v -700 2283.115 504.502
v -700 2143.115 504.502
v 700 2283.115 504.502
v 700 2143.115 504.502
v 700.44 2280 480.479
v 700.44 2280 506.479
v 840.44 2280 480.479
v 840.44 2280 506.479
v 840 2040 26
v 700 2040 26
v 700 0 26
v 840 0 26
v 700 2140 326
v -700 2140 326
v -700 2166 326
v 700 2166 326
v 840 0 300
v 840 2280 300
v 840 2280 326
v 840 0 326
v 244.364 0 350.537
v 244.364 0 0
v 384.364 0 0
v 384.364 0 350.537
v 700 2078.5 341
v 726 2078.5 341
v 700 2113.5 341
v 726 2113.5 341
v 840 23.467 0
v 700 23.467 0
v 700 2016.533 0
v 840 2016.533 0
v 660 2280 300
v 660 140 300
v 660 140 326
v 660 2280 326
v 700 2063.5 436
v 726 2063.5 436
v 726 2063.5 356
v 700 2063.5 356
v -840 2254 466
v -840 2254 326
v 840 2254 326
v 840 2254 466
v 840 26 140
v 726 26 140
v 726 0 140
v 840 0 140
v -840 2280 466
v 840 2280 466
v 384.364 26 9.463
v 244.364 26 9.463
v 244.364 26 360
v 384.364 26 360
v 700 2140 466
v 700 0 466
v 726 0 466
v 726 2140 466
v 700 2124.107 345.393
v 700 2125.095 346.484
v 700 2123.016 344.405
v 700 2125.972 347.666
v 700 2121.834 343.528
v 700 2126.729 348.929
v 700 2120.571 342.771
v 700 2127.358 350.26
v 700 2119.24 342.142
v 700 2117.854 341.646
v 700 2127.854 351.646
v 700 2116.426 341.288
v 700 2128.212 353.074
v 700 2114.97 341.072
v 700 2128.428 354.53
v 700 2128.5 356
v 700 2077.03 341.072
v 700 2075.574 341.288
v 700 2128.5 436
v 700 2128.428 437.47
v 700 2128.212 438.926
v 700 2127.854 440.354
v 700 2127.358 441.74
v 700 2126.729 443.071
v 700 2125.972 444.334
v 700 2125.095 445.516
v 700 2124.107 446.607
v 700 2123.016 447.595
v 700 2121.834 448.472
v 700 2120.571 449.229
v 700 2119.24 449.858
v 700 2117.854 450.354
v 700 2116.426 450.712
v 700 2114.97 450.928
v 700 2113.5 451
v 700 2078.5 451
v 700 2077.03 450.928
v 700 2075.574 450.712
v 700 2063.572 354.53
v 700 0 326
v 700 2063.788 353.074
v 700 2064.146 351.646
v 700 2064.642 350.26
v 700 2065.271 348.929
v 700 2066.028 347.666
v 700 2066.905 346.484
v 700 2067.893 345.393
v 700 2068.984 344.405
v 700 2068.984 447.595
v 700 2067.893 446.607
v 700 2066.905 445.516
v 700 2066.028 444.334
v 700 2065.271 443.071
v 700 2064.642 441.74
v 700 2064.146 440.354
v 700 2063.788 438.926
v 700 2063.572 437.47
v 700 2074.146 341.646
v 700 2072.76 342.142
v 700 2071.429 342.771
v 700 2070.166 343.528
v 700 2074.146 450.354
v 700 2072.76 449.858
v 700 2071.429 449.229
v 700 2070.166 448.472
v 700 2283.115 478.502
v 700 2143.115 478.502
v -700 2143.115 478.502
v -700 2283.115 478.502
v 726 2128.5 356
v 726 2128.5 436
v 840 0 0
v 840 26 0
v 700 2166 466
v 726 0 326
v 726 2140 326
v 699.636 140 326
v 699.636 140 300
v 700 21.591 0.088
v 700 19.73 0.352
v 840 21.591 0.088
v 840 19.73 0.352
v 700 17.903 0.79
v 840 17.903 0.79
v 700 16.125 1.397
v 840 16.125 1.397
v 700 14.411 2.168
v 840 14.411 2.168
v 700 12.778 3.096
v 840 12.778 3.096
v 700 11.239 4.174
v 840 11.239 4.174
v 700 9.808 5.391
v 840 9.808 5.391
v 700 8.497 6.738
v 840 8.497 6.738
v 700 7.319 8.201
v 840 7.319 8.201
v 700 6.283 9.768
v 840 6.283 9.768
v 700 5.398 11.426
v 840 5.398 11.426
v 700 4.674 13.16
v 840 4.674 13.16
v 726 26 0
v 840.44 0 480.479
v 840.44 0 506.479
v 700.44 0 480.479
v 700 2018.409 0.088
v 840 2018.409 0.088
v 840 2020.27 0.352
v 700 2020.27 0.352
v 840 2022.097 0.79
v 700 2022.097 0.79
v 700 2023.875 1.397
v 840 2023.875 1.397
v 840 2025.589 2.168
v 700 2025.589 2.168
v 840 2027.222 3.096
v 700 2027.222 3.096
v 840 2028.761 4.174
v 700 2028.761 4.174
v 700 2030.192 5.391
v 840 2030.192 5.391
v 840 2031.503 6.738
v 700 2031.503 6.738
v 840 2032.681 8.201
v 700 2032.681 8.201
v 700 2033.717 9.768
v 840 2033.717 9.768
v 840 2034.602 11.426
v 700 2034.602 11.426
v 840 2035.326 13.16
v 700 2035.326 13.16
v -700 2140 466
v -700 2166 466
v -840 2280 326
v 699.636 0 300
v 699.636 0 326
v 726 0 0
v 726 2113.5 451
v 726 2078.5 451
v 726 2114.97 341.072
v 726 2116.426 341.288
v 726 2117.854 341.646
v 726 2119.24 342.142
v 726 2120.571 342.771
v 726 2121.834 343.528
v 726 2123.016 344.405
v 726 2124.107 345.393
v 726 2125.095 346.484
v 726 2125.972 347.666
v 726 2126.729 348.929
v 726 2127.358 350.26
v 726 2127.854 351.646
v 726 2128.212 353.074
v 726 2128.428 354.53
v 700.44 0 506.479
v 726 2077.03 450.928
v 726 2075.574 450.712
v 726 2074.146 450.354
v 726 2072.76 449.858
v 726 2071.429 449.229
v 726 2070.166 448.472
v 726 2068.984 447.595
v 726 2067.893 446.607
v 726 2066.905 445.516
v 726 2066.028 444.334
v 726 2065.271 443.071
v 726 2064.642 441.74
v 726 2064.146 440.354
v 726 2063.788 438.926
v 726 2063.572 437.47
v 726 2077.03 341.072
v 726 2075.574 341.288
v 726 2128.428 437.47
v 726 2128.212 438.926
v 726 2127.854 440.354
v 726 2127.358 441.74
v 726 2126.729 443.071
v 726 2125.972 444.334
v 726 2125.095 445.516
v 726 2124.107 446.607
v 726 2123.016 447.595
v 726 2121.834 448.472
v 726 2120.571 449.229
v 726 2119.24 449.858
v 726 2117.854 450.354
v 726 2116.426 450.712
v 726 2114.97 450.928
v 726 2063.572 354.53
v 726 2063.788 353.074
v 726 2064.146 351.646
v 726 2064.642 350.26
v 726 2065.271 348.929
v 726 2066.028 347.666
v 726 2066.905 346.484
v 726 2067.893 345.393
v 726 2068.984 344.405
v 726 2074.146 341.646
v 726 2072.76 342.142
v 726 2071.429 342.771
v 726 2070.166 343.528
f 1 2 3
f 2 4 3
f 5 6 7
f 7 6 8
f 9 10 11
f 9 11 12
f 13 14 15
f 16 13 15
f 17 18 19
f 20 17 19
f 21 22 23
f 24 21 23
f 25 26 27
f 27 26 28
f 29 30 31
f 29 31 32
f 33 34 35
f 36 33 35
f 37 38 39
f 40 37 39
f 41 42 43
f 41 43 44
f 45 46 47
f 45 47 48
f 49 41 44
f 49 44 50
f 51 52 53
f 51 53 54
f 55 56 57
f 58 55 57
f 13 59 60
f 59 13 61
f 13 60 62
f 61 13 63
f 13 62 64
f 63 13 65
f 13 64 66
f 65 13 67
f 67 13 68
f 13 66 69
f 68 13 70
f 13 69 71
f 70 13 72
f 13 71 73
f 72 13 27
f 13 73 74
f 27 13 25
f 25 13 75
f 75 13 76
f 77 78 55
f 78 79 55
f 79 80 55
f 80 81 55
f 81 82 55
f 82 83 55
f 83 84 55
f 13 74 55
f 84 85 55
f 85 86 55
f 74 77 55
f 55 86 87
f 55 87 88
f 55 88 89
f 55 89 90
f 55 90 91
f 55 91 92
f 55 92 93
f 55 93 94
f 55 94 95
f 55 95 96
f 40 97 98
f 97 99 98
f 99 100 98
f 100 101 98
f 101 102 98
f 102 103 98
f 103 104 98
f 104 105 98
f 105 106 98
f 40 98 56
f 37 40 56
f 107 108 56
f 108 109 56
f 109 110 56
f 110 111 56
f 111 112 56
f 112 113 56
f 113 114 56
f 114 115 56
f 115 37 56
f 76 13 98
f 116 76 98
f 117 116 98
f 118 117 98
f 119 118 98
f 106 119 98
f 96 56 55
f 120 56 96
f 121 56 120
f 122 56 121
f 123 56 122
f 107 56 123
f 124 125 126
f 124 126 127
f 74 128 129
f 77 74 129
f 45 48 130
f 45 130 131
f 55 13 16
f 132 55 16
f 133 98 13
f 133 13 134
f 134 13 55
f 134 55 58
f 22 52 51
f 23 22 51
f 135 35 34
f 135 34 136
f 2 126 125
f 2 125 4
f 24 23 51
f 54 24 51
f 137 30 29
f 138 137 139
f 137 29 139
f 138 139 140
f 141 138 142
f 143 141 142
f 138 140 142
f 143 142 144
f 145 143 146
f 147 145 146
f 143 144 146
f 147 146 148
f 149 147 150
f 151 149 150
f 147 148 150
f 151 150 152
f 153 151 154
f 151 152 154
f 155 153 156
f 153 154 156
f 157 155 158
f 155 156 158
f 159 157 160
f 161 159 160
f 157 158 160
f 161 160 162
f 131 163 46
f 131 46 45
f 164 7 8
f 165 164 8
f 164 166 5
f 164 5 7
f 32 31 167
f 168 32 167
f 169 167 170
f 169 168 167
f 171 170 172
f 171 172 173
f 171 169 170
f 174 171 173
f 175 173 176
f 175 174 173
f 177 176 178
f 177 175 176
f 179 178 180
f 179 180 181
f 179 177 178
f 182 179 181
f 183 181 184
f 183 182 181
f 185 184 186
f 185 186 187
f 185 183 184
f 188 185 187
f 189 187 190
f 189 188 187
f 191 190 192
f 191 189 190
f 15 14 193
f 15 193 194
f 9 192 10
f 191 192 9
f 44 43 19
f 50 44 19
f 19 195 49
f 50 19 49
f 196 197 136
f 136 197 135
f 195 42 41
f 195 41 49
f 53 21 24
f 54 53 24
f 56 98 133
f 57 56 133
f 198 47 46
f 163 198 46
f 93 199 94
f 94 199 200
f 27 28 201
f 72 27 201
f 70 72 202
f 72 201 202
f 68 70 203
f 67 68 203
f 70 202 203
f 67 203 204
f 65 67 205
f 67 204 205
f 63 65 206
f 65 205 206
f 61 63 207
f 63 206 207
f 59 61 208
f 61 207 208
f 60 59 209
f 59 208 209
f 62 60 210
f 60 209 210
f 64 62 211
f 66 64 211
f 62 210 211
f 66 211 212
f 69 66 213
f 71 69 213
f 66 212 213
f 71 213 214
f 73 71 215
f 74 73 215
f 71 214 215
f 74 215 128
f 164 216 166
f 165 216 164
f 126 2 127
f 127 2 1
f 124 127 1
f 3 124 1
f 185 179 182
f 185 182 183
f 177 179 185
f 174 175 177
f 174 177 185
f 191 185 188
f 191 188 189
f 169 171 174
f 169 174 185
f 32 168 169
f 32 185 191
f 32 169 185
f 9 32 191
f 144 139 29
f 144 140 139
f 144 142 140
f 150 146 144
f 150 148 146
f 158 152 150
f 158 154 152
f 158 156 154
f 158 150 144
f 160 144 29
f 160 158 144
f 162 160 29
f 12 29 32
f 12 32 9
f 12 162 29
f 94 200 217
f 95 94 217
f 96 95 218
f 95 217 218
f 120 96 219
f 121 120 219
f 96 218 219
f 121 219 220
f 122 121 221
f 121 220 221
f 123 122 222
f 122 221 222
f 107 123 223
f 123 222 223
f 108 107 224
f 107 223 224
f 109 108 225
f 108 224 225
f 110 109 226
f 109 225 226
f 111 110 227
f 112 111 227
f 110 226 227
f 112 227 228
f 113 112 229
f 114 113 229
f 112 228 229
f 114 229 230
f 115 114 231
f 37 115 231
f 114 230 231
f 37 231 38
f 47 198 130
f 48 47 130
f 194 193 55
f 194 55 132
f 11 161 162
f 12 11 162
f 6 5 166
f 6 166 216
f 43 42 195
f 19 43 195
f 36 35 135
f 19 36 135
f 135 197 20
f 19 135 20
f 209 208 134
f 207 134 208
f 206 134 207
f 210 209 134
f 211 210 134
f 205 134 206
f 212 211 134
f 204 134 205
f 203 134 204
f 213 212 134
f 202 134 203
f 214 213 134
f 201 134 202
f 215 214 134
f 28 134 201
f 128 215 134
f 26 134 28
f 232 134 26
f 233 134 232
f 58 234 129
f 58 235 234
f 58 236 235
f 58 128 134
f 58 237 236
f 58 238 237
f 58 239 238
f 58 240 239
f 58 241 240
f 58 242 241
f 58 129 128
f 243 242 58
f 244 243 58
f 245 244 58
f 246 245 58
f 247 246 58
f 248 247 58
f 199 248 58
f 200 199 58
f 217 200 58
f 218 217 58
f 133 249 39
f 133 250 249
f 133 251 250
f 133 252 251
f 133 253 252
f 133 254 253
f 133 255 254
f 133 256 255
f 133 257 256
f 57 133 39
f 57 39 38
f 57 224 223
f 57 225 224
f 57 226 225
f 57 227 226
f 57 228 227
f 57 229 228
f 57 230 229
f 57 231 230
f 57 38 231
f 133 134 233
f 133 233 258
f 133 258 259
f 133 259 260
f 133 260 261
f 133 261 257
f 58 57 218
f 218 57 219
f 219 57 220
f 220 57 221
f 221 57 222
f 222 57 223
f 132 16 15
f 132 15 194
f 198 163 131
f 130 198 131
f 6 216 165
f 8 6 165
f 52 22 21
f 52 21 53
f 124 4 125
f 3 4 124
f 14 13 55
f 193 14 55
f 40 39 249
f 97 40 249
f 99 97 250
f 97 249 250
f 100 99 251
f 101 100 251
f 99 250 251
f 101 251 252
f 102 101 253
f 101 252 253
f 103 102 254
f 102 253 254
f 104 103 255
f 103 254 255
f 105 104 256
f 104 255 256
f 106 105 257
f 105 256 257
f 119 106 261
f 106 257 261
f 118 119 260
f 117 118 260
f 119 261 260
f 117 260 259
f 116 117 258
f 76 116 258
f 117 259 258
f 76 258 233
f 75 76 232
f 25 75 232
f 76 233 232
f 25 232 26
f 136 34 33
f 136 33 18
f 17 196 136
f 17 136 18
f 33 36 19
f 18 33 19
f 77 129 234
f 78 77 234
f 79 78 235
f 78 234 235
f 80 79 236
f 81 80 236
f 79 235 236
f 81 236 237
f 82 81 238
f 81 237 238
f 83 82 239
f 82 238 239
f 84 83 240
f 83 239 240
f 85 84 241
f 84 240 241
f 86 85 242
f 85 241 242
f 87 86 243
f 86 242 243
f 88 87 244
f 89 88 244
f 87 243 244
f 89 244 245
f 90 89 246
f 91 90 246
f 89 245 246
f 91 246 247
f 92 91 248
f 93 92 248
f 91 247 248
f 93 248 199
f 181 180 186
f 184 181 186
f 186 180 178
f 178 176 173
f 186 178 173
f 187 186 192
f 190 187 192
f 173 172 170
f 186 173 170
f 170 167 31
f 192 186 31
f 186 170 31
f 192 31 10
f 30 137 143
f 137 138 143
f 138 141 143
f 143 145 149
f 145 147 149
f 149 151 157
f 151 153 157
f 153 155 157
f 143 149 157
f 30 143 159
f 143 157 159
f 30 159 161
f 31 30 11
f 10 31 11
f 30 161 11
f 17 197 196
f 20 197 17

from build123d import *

# Parameters (mm, degrees)
F0_W        = 140
F0_H        = 26
F1_DEPTH    = 2040
F2_SIZE2    = 9.463216
F2_SIZE     = 25.99999
F2_2_SIZE2  = 9.463216
F2_2_SIZE   = 25.99999
F3_W        = 180
F3_H        = 26
F4_DEPTH    = 2280
F5_W        = 40
F5_H        = 140
F6_DEPTH    = 26
F7_W        = 114
F7_H        = 26
F8_DEPTH    = 140
F9_W        = 26
F9_H        = 140
F10_DEPTH   = 2140
F12_W       = 26
F12_H       = 140
F13_DEPTH   = 840
F14_W       = 26
F14_H       = 140
F15_DEPTH   = 700
F16_W       = 140
F16_H       = 26
F17_DEPTH   = 360
F18_SIZE2   = 9.463216
F18_SIZE    = 25.99999
F18_2_SIZE2 = 9.463216
F18_2_SIZE  = 25.99999
F19_W       = 140
F19_H       = 26
F20_DEPTH   = 700
F21_W       = 140
F21_H       = 26
F22_DEPTH   = 2280
F23_DEPTH   = 1566.001
F24_R       = 20


# Not quite as in the source:
# - a fillet or chamfer is up to 0.001 mm smaller than in the source, because OpenCascade refuses the exact size


with BuildPart() as f1:
    # F0 (on Front) → F1 (new body)
    with BuildSketch(Plane.XZ):
        with Locations((770, 13)):
            Rectangle(F0_W, F0_H)
    extrude(amount=-F1_DEPTH)

    # F2 (size 26 and 9.4632260909 in the source; OpenCascade refuses exactly that, so slightly less here)
    f2_edges = [f1.edges().sort_by_distance(p)[0] for p in [
        (770, 0, 0),
    ]]
    f2_side = f1.faces().sort_by_distance((770, 0, 13))[0]
    chamfer(f2_edges, length=F2_SIZE, length2=F2_SIZE2, reference=f2_side)

    # F2#2 (size 26 and 9.4632260909 in the source; OpenCascade refuses exactly that, so slightly less here)
    f2_2_edges = [f1.edges().sort_by_distance(p)[0] for p in [
        (770, 2040, 0),
    ]]
    f2_2_side = f1.faces().sort_by_distance((770, 2040, 13))[0]
    chamfer(f2_2_edges, length=F2_2_SIZE, length2=F2_2_SIZE2, reference=f2_2_side)

    # F24
    f24_edges = [f1.edges().sort_by_distance(p)[0] for p in [
        (770, 9.463216, 0),
        (770, 2030.536784, 0),
    ]]
    fillet(f24_edges, radius=F24_R)


with BuildPart() as f4:
    # F3 (on Front) → F4 (new body)
    with BuildSketch(Plane.XZ):
        with Locations((750, 313)):
            Rectangle(F3_W, F3_H)
    extrude(amount=-F4_DEPTH)

    # F5 (on face) → F6 (cut, through all)
    with BuildSketch(Plane.XY.offset(326)):
        with Locations((679.6356630325, 70)):
            Rectangle(F5_W, F5_H)
    extrude(amount=-F6_DEPTH, mode=Mode.SUBTRACT)


with BuildPart() as f8:
    # F7 (on Top) → F8 (new body)
    with BuildSketch(Plane.XY):
        with Locations((783, 13)):
            Rectangle(F7_W, F7_H)
    extrude(amount=F8_DEPTH)


with BuildPart() as f10:
    # F9 (on Front) → F10 (new body)
    with BuildSketch(Plane.XZ):
        with Locations((713, 396)):
            Rectangle(F9_W, F9_H)
    extrude(amount=-F10_DEPTH)

    # F11 (on face) → F23 (cut, through all)
    with BuildSketch(Plane.YZ.offset(726)):
        with BuildLine():
            ThreePointArc((2128.5, 436), (2124.1066017178, 446.6066017178), (2113.5, 451))
            Line((2113.5, 451), (2078.5, 451))
            ThreePointArc((2078.5, 451), (2067.8933982822, 446.6066017178), (2063.5, 436))
            Line((2063.5, 436), (2063.5, 356))
            ThreePointArc((2063.5, 356), (2067.8933982822, 345.3933982822), (2078.5, 341))
            Line((2078.5, 341), (2113.5, 341))
            ThreePointArc((2113.5, 341), (2124.1066017178, 345.3933982822), (2128.5, 356))
            Line((2128.5, 356), (2128.5, 436))
        make_face()
    extrude(amount=-F23_DEPTH, mode=Mode.SUBTRACT)


with BuildPart() as f13:
    # F12 (on Right) → F13 (new body, symmetric)
    with BuildSketch(Plane.YZ):
        with Locations((2267, 396)):
            Rectangle(F12_W, F12_H)
    extrude(amount=F13_DEPTH, both=True)


with BuildPart() as f15:
    # F14 (on Right) → F15 (new body, symmetric)
    with BuildSketch(Plane.YZ):
        with Locations((2153, 396)):
            Rectangle(F14_W, F14_H)
    extrude(amount=F15_DEPTH, both=True)


with BuildPart() as f17:
    # F16 (on Top) → F17 (new body)
    with BuildSketch(Plane.XY):
        with Locations((314.363963604, 13)):
            Rectangle(F16_W, F16_H)
    extrude(amount=F17_DEPTH)

    # F18 (size 26 and 9.4632260909 in the source; OpenCascade refuses exactly that, so slightly less here)
    f18_edges = [f17.edges().sort_by_distance(p)[0] for p in [
        (314.363964, 0, 360),
    ]]
    f18_side = f17.faces().sort_by_distance((314.363964, 13, 360))[0]
    chamfer(f18_edges, length=F18_SIZE, length2=F18_SIZE2, reference=f18_side)

    # F18#2 (size 26 and 9.4632260909 in the source; OpenCascade refuses exactly that, so slightly less here)
    f18_2_edges = [f17.edges().sort_by_distance(p)[0] for p in [
        (314.363964, 26, 0),
    ]]
    f18_2_side = f17.faces().sort_by_distance((314.363964, 13, 0))[0]
    chamfer(f18_2_edges, length=F18_2_SIZE, length2=F18_2_SIZE2, reference=f18_2_side)


with BuildPart() as f20:
    # F19 (on Right) → F20 (new body, symmetric)
    with BuildSketch(Plane.YZ):
        with Locations((2213.114566803, 491.5019755363)):
            Rectangle(F19_W, F19_H)
    extrude(amount=F20_DEPTH, both=True)


with BuildPart() as f22:
    # F21 (on Front) → F22 (new body)
    with BuildSketch(Plane.XZ):
        with Locations((770.4404592514, 493.4790836821)):
            Rectangle(F21_W, F21_H)
    extrude(amount=-F22_DEPTH)


solid = Compound([f1.part, f4.part, f8.part, f10.part, f13.part, f15.part, f17.part, f20.part, f22.part])
